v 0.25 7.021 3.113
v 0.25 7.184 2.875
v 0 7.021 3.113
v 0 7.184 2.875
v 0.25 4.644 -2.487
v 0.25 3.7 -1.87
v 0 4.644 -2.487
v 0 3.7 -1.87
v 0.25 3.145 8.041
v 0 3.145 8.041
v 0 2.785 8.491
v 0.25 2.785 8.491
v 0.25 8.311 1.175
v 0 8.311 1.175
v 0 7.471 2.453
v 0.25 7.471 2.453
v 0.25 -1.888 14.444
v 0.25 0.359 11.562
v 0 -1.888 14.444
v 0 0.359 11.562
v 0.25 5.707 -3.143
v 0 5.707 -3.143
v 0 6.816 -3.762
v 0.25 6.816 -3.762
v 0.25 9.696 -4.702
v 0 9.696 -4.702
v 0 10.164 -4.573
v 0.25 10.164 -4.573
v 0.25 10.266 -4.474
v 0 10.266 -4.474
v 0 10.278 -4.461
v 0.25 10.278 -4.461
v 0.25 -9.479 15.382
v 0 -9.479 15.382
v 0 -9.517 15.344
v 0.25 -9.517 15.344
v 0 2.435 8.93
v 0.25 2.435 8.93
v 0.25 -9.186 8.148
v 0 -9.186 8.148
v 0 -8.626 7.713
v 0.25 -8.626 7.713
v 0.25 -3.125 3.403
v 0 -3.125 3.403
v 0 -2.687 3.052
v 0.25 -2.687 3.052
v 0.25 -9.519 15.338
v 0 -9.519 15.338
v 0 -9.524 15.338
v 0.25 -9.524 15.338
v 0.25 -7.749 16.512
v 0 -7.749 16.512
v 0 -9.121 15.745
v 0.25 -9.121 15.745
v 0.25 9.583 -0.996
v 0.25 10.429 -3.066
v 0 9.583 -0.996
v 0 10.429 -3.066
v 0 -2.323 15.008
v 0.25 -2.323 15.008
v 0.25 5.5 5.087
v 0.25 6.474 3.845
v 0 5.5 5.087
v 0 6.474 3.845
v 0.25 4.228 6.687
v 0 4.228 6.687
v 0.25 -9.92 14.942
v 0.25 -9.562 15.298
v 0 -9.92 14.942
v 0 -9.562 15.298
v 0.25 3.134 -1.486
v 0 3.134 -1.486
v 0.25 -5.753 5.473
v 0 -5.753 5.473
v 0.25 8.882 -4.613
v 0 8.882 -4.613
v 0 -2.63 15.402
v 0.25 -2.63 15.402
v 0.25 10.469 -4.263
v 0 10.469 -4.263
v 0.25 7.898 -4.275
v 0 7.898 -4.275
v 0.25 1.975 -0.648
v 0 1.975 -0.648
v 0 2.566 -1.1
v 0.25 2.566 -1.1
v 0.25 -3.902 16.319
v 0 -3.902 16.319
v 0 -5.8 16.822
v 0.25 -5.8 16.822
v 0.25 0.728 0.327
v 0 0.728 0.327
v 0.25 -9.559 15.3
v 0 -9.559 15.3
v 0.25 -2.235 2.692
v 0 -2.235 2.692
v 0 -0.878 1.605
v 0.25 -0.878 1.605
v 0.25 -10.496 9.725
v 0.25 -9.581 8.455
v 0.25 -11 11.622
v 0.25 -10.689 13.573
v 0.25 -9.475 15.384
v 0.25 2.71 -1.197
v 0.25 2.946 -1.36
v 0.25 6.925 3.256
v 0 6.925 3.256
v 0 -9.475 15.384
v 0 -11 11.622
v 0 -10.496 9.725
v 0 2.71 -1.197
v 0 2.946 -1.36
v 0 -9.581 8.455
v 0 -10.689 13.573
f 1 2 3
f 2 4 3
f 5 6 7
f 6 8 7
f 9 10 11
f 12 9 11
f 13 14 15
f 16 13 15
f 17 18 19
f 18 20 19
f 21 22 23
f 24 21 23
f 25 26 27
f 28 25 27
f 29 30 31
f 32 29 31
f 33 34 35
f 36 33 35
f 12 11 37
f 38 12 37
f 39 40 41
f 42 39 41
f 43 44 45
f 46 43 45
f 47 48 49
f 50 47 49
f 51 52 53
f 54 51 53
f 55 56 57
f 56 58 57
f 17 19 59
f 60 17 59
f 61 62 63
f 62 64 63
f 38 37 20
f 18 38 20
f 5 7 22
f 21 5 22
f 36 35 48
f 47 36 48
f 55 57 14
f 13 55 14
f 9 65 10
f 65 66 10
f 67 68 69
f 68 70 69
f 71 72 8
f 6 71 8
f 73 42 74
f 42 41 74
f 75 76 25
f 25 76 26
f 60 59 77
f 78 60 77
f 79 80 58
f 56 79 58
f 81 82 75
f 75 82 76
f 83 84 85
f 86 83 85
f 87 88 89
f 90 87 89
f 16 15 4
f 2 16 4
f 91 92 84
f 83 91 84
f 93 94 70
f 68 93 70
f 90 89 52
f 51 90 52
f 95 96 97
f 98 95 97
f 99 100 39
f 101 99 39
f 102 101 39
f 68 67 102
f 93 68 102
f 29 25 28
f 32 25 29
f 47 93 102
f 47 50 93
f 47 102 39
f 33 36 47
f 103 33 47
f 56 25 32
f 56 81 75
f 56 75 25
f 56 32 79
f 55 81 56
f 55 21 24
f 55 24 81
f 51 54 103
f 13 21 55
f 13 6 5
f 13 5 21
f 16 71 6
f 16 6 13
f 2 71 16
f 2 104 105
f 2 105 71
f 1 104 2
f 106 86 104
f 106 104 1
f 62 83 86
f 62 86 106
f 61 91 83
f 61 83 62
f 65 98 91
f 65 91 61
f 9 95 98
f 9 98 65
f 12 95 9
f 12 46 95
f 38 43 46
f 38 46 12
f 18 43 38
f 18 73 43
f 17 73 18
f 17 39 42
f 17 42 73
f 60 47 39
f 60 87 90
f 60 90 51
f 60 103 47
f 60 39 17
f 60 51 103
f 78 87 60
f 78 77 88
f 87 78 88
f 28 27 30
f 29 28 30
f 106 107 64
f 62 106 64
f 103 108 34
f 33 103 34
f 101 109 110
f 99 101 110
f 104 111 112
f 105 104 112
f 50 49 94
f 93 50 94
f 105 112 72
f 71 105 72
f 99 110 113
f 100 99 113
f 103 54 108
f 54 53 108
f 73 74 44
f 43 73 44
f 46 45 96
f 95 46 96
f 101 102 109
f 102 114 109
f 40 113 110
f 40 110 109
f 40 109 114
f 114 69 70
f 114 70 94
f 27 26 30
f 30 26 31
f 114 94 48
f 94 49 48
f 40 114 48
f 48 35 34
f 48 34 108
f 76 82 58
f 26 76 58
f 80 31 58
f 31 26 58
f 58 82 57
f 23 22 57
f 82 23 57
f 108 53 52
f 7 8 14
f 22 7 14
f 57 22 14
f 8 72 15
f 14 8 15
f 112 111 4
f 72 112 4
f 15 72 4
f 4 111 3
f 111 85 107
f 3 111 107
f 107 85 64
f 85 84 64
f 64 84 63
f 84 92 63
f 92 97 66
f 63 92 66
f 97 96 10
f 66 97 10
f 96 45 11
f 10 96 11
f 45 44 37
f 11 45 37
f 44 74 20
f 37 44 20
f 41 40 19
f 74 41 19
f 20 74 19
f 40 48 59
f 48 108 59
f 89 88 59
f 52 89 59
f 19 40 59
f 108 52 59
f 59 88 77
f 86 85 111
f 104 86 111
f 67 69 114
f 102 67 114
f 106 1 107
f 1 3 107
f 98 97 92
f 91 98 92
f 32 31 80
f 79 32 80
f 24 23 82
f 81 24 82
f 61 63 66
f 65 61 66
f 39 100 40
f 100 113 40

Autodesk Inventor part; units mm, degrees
ref_plane "YZ Plane" through (0, 0, 0) normal (1, 0, 0) x (0, 1, 0)
ref_plane "XZ Plane" through (0, 0, 0) normal (0, 1, 0) x (-1, 0, 0)
ref_plane "XY Plane" through (0, 0, 0) normal (0, 0, 1) x (1, 0, 0)
sketch "Sketch1" plane through (0, 0, 0) normal (1, 0, 0) x (0, 1, 0)
  line L0 (11.5153, 6.5399) -> (13.2626, 6.1589)
  line L1 (-9.5192, 15.3385) -> (-9.5235, 15.3385)
  line L2 (-9.5235, 15.3385) -> (-9.5593, 15.3004)
  line L3 (-9.5593, 15.3004) -> (-9.5621, 15.2978)
  line L4 (-9.5621, 15.2978) -> (-9.9203, 14.9422)
  line L5 (-9.9203, 14.9422) -> (-10.6894, 13.5732)
  line L6 (-10.6894, 13.5732) -> (-10.9995, 11.6224)
  line L7 (-10.9995, 11.6224) -> (-10.4963, 9.7251)
  line L8 (-10.4963, 9.7251) -> (-9.5812, 8.4551)
  line L9 (-9.5812, 8.4551) -> (-9.1857, 8.1477)
  line L10 (-9.1857, 8.1477) -> (-8.6264, 7.7134)
  line L11 (-8.6264, 7.7134) -> (-5.7531, 5.4731)
  line L12 (-5.7531, 5.4731) -> (-3.125, 3.403)
  line L13 (-3.125, 3.403) -> (-2.6869, 3.0525)
  line L14 (-2.6869, 3.0525) -> (-2.235, 2.6918)
  line L15 (-2.235, 2.6918) -> (-0.8776, 1.6047)
  line L16 (-0.8776, 1.6047) -> (0.7277, 0.3271)
  line L17 (0.7277, 0.3271) -> (1.9751, -0.6483)
  line L18 (1.9751, -0.6483) -> (2.5659, -1.1004)
  line L19 (2.5659, -1.1004) -> (2.7096, -1.1969)
  line L20 (2.7096, -1.1969) -> (2.9464, -1.3595)
  line L21 (2.9464, -1.3595) -> (3.1338, -1.4865)
  line L22 (3.1338, -1.4865) -> (3.7002, -1.87)
  line L23 (3.7002, -1.87) -> (4.6441, -2.4873)
  line L24 (4.6441, -2.4873) -> (5.7068, -3.1426)
  line L25 (5.7068, -3.1426) -> (6.8158, -3.7623)
  line L26 (6.8158, -3.7623) -> (7.8978, -4.2754)
  line L27 (7.8978, -4.2754) -> (8.8818, -4.6132)
  line L28 (8.8818, -4.6132) -> (9.6959, -4.7021)
  line L29 (9.6959, -4.7021) -> (10.1645, -4.5726)
  line L30 (10.1645, -4.5726) -> (10.2664, -4.4735)
  line L31 (10.2664, -4.4735) -> (10.2776, -4.4608)
  line L32 (10.2776, -4.4608) -> (10.4693, -4.2627)
  line L33 (10.4693, -4.2627) -> (10.4289, -3.0664)
  line L34 (10.4289, -3.0664) -> (9.5831, -0.9963)
  line L35 (9.5831, -0.9963) -> (8.3108, 1.1754)
  line L36 (8.3108, 1.1754) -> (7.4706, 2.453)
  line L37 (7.4706, 2.453) -> (7.1838, 2.8747)
  line L38 (7.1838, 2.8747) -> (7.0213, 3.1134)
  line L39 (7.0213, 3.1134) -> (6.9248, 3.2557)
  line L40 (6.9248, 3.2557) -> (6.4739, 3.845)
  line L41 (6.4739, 3.845) -> (5.5001, 5.087)
  line L42 (5.5001, 5.087) -> (4.2278, 6.6872)
  line L43 (4.2278, 6.6872) -> (3.145, 8.041)
  line L44 (3.145, 8.041) -> (2.7851, 8.4906)
  line L45 (2.7851, 8.4906) -> (2.4351, 8.93)
  line L46 (2.4351, 8.93) -> (0.3586, 11.5615)
  line L47 (0.3586, 11.5615) -> (-1.8878, 14.4444)
  line L48 (-1.8878, 14.4444) -> (-2.3231, 15.0083)
  line L49 (-2.3231, 15.0083) -> (-2.6305, 15.402)
  line L50 (-2.6305, 15.402) -> (-3.9025, 16.3189)
  line L51 (-3.9025, 16.3189) -> (-5.8001, 16.8218)
  line L52 (-5.8001, 16.8218) -> (-7.7486, 16.5119)
  line L53 (-7.7486, 16.5119) -> (-9.1212, 15.7449)
  line L54 (-9.1212, 15.7449) -> (-9.475, 15.3842)
  line L55 (-9.475, 15.3842) -> (-9.4793, 15.3816)
  line L56 (-9.4793, 15.3816) -> (-9.5167, 15.3435)
  line L57 (-9.5167, 15.3435) -> (-9.5192, 15.3385)
extrude "Extrusion27" add sketch "Sketch1" along normal blind 0.25
sketch "Sketch7" plane through (0, 0, 0) normal (-1, 0, 0) x (0, 0, 1)
  circle A0 centre (11.7567, -6.0872) radius 5
  circle A1 centre (11.7567, -6.0872) radius 0.5
  point P0 (0, 0)
  dimension "d91" = 10
  dimension "d92" = 1
extrude "Extrusion30" [suppressed]
properties part number "Sticker7"
